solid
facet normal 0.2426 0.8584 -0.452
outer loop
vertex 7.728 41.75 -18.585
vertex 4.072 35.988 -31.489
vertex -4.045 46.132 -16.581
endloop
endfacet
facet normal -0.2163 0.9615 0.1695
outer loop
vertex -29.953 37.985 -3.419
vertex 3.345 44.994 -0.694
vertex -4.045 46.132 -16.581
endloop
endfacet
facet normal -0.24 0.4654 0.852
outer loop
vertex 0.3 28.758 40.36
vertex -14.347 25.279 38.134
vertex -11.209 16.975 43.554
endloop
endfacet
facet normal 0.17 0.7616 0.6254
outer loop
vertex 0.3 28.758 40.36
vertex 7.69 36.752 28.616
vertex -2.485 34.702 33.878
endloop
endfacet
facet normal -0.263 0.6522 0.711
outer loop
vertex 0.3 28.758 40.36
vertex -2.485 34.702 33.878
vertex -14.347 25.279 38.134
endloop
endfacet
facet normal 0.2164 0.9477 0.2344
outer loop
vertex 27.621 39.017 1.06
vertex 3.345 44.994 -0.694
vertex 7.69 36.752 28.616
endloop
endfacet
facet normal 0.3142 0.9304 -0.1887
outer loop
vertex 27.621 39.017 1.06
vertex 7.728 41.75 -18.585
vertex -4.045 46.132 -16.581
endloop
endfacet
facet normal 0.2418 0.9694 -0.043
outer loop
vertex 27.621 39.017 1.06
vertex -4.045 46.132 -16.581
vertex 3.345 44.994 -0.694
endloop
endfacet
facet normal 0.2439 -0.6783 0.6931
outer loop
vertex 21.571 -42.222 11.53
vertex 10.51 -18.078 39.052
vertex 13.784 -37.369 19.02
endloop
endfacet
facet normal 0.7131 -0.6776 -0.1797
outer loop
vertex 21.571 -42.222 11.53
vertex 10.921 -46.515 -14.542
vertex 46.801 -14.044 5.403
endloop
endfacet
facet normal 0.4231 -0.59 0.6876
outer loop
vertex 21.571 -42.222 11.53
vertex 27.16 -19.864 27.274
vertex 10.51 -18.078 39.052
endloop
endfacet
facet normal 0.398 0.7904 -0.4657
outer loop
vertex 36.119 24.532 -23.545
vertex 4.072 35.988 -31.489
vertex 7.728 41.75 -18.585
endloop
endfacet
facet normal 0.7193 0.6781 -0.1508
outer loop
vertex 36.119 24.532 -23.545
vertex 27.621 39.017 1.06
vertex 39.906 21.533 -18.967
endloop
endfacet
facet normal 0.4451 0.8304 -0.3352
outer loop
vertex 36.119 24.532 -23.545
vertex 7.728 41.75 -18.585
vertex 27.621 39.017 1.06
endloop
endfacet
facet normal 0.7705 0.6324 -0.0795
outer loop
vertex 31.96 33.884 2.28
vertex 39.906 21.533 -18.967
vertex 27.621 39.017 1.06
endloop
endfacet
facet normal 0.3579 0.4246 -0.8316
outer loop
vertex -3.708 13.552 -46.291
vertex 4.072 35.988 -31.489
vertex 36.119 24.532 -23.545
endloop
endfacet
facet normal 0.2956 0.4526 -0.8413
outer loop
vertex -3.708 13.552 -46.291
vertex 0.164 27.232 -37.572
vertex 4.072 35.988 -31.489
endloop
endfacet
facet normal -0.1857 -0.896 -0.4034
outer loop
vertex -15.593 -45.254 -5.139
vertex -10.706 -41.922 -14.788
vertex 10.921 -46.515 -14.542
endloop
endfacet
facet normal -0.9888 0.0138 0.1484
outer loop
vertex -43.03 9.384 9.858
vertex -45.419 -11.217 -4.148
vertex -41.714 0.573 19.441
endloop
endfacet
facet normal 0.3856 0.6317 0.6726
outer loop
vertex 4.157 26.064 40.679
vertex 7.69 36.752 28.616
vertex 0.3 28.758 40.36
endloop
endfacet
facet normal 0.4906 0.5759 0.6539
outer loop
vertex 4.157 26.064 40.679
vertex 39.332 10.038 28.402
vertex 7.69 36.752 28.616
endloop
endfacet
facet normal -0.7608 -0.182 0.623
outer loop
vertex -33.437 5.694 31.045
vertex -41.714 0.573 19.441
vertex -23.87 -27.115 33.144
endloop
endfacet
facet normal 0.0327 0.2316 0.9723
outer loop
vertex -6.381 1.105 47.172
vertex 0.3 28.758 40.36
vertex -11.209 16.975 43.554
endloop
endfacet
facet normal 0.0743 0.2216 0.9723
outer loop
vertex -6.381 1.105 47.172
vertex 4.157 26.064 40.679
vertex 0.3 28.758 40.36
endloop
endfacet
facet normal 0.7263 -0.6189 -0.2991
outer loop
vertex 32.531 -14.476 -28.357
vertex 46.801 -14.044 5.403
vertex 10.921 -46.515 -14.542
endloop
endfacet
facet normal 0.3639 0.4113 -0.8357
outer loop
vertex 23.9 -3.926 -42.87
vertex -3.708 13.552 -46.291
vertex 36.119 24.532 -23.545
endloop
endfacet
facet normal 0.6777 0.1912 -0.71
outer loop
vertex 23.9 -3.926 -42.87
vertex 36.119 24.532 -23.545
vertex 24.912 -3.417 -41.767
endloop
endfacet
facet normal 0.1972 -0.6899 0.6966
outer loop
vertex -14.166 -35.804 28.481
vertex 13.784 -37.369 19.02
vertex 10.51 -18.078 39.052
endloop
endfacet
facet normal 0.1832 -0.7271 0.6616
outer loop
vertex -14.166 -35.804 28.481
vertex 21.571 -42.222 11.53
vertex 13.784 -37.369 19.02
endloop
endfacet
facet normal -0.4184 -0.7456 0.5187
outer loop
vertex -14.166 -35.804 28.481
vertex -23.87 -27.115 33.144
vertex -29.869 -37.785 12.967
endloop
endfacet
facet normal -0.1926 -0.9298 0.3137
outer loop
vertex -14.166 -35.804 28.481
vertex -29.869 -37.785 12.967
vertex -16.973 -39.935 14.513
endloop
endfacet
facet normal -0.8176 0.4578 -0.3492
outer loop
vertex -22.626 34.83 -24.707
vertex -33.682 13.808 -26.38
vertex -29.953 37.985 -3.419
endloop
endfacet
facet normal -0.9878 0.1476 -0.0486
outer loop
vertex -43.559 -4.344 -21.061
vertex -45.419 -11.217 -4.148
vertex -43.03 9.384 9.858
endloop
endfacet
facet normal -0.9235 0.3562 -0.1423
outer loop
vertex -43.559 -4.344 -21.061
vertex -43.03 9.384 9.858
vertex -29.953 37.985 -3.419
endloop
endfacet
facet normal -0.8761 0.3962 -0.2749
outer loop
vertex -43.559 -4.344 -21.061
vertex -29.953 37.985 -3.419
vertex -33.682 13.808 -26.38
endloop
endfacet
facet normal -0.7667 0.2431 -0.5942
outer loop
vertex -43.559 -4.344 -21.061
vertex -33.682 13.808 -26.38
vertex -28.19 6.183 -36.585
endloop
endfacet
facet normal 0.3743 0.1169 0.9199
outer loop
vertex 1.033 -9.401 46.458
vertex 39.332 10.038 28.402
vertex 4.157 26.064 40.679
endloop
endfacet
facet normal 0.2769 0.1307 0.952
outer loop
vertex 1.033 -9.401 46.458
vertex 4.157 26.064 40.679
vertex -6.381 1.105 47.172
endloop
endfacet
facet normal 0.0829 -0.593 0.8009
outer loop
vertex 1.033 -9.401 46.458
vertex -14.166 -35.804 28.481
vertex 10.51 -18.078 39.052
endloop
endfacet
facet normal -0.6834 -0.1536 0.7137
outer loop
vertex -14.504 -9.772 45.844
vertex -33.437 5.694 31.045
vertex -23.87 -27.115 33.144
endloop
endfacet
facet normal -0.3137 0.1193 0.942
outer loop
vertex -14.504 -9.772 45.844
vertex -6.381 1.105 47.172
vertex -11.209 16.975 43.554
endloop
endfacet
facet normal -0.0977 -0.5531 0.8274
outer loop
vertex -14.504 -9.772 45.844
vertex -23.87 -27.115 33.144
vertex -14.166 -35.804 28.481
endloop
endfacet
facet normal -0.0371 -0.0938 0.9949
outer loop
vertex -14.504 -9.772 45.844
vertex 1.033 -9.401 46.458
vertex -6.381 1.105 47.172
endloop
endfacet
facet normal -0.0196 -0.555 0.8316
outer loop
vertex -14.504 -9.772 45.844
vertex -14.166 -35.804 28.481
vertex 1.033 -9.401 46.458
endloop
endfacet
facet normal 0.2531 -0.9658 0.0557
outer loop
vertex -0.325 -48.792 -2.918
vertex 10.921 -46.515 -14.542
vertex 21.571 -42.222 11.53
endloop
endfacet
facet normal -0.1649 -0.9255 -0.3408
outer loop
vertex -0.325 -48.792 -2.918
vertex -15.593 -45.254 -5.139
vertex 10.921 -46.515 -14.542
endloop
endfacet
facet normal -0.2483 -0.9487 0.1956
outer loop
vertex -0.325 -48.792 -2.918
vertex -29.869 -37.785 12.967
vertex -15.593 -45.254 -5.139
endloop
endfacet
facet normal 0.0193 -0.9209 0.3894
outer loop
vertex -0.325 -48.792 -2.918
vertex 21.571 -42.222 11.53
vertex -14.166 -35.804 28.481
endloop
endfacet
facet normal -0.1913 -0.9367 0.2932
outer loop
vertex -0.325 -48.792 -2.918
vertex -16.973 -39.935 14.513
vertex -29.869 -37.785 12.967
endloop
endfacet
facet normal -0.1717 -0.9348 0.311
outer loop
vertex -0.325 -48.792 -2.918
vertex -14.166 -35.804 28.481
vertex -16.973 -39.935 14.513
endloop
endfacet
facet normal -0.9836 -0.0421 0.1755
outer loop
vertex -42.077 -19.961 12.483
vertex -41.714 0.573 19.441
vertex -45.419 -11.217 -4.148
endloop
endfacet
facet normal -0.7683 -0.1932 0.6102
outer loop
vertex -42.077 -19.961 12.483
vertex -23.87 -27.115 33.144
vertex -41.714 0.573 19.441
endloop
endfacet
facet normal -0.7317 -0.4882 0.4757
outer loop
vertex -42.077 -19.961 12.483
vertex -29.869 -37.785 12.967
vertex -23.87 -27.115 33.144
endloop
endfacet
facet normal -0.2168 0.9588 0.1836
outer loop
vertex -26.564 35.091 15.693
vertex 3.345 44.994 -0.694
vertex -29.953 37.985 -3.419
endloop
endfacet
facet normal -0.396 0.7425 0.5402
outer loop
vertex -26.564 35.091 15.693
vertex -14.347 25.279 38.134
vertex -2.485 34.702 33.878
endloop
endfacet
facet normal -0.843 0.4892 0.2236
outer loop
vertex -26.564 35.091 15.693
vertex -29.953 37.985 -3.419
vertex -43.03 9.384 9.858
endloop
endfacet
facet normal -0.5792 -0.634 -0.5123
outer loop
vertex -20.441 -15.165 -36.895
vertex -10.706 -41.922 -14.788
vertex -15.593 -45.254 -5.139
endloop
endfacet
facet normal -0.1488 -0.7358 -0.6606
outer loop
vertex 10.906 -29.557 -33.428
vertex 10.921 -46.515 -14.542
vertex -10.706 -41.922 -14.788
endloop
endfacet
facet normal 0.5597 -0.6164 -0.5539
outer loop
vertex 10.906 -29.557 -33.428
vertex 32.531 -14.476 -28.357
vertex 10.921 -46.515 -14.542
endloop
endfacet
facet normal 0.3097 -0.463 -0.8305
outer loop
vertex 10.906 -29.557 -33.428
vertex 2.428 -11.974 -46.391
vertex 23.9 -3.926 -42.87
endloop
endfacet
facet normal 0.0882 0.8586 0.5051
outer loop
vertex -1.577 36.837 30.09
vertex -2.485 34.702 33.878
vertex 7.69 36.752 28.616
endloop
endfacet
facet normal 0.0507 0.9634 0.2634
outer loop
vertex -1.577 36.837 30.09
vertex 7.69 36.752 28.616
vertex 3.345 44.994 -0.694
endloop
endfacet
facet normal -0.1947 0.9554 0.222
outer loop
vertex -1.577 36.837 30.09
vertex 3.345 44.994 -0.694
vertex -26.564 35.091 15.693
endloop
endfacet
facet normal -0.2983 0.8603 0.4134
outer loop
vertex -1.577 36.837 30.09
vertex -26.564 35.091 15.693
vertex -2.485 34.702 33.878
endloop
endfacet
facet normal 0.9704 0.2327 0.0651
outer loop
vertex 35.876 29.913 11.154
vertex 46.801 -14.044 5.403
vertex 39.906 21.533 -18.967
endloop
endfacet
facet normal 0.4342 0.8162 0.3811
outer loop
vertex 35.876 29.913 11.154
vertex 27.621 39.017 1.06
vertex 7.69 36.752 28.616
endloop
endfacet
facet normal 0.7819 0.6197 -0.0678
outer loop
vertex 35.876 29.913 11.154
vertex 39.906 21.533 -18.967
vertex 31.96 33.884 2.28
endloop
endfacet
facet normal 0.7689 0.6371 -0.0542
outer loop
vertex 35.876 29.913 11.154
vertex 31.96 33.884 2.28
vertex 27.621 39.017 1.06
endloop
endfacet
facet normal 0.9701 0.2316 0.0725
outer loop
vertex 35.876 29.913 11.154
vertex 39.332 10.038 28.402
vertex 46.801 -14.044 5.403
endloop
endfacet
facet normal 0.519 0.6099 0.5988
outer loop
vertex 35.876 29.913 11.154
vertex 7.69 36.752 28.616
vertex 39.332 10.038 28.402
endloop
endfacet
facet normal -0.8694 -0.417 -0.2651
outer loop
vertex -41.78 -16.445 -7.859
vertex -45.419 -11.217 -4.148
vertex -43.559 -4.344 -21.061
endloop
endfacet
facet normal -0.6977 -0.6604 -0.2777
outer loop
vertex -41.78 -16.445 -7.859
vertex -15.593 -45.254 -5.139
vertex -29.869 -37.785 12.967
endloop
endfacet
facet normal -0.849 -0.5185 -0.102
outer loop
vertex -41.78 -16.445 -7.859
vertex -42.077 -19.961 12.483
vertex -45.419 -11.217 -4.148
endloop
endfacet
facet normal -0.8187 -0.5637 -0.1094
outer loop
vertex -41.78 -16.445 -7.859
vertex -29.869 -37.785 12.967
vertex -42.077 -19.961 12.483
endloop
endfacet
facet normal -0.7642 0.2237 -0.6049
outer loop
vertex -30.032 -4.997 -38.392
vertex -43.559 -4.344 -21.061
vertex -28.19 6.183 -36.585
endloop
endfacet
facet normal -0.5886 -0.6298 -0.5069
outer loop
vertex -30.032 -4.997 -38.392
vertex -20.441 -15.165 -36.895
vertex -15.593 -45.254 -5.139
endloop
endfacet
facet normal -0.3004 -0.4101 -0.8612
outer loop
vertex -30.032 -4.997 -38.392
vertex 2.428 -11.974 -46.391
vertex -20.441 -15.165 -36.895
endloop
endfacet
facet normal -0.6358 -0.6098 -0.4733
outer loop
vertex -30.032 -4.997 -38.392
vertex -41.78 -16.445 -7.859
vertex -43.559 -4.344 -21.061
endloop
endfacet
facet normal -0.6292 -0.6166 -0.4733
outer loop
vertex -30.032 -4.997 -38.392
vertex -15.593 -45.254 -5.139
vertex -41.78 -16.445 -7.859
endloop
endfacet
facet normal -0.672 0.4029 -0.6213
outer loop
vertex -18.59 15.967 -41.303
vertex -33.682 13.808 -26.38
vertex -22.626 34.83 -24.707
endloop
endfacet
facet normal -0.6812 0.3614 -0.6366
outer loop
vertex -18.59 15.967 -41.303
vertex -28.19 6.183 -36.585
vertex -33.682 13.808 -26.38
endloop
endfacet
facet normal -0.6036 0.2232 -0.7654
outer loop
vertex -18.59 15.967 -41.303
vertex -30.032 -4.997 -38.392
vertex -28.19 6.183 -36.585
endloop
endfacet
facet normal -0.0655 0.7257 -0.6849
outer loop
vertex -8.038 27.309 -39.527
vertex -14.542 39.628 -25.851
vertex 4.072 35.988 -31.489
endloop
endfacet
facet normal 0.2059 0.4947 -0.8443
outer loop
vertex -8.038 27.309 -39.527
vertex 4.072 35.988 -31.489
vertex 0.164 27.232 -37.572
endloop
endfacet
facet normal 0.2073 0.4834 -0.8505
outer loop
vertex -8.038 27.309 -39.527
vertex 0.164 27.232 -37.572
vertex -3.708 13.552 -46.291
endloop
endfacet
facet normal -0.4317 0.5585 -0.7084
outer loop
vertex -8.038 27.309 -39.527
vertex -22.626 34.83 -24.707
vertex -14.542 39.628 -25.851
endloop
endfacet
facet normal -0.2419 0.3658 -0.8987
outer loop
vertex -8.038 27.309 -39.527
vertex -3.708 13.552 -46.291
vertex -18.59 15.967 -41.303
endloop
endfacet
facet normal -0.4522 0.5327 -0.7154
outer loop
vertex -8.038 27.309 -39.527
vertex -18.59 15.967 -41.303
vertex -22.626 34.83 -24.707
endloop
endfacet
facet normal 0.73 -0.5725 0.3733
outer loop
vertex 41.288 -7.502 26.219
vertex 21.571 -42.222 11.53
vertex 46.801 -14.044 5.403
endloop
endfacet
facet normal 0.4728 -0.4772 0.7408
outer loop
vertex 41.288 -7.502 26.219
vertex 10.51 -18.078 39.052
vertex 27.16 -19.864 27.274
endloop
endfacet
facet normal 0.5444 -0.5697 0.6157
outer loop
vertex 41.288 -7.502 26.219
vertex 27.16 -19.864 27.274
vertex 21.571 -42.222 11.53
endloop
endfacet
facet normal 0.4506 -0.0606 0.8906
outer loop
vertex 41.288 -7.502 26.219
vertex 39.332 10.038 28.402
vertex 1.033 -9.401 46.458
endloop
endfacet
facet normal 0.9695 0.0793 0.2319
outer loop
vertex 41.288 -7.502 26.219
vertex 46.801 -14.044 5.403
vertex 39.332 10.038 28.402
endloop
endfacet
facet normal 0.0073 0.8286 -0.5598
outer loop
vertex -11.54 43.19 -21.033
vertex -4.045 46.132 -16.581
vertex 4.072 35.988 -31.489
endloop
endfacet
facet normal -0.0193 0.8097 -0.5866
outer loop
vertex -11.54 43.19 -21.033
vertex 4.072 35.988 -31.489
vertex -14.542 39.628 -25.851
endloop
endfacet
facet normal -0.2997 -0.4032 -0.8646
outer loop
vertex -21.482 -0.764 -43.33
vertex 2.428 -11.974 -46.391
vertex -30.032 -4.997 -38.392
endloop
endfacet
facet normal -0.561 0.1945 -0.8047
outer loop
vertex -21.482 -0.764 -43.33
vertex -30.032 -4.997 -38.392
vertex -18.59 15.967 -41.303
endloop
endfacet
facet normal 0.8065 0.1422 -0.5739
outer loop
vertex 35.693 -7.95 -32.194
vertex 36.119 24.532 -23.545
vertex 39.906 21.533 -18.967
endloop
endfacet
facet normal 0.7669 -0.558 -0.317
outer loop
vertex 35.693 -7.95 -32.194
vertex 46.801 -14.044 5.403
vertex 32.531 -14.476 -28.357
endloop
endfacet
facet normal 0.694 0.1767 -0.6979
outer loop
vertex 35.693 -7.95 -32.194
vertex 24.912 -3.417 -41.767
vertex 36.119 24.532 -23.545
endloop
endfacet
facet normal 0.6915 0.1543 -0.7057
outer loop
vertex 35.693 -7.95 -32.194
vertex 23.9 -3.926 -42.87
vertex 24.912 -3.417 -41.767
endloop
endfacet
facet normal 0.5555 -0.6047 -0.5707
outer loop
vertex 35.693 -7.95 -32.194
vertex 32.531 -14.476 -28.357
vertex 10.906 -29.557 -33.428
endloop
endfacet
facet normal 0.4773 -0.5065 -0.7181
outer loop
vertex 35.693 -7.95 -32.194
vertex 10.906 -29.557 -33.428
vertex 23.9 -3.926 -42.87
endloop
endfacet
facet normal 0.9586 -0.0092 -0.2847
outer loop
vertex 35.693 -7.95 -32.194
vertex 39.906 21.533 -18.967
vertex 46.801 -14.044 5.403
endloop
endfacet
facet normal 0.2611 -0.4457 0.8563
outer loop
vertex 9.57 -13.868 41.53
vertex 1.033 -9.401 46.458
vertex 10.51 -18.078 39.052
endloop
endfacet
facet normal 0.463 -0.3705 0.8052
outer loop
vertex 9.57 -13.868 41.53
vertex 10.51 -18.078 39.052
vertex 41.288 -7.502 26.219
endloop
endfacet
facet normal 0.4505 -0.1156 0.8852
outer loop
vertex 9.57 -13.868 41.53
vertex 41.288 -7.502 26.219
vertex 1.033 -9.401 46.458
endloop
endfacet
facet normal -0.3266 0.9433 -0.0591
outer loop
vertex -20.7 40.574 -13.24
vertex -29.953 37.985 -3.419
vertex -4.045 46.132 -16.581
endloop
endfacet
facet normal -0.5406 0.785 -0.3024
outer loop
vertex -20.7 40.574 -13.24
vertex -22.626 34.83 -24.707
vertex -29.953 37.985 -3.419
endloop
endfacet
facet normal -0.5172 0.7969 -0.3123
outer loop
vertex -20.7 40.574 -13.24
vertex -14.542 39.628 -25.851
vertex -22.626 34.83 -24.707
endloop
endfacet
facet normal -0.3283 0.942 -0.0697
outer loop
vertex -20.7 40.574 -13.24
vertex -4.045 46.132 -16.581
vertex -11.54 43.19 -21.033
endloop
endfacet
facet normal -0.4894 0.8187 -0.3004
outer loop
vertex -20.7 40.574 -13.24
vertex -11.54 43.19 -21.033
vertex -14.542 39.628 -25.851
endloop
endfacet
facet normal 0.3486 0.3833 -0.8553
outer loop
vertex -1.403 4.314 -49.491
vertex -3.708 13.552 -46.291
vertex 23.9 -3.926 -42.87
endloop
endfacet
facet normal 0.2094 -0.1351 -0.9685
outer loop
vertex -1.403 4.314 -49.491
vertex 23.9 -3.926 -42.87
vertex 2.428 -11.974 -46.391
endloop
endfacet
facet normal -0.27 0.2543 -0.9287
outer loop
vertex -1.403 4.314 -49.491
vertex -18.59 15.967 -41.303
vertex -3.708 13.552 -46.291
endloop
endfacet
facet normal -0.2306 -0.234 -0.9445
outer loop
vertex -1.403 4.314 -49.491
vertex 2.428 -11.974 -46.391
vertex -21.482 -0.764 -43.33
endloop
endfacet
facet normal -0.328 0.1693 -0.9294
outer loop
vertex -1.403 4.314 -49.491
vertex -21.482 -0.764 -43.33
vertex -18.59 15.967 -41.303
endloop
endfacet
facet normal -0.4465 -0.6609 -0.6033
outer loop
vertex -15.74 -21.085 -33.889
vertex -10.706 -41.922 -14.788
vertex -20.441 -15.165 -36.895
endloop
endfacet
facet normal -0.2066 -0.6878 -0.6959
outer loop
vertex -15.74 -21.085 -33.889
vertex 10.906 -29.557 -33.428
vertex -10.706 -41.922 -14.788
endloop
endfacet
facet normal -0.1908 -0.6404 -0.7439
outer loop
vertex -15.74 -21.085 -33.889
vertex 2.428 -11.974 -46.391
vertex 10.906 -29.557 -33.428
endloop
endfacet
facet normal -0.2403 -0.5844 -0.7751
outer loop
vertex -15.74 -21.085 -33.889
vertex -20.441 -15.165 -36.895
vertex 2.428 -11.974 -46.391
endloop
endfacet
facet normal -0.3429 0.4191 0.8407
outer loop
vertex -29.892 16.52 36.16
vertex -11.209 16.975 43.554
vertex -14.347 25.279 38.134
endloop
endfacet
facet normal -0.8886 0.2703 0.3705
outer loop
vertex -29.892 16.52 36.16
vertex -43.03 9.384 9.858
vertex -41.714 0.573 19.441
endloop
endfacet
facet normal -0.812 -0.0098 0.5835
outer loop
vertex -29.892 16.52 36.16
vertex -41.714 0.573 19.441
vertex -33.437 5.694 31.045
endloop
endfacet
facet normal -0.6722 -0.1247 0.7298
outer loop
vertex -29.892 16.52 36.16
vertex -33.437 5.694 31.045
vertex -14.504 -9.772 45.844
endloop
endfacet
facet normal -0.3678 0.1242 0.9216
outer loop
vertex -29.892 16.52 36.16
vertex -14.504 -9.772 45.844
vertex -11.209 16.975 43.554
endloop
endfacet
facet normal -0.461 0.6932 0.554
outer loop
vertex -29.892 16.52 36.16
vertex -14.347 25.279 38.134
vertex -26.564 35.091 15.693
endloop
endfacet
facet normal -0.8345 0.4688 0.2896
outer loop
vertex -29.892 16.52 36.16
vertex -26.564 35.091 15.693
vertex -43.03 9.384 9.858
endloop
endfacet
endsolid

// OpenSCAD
dimension = 3;
maxNumberOfPoints = 500;
seed = 1;
radius = 50;

module end_of_parameters_dummy() {}


//BEGIN: use <pointhull.scad>;
function _slice(list,start,end=undef) =
    let(end = end==undef?len(list):end)
    [for(i=[start:1:end-1]) list[i]];

function _delete(list,pos) =
    let(l=len(list))
    pos == 0 ? [for(i=[1:1:l-1]) list[i]] :
    pos >= l-1 ? [for(i=[0:1:pos-1]) list[i]] :
    concat([for(i=[0:1:pos-1]) list[i]],
        [for(i=[pos+1:1:l-1]) list[i]]);

function _areCollinear(a,b,c) = cross(b-a,c-a) == [0,0,0];

function _areCoplanar(a,b,c,d) = (d-a)*cross(b-a,c-a) == 0;

function _findNoncollinear(list,point1,point2,pos=0) =
    pos >= len(list) ? undef :
    ! _areCollinear(point1,point2,list[pos]) ? pos :
    _findNoncollinear(list,point1,point2,pos=pos+1);

function _findNoncoplanar(list,point1,point2,point3,pos=0) =
   pos >= len(list) ? undef :
   ! _areCoplanar(point1,point2,point3,list[pos]) ? pos :
        _findNoncoplanar(list,point1,point2,point3,pos=pos+1);

function _isBoundedBy(a,face,strict=false) =
    cross(face[1]-face[0],face[2]-face[0])*(a-face[0]);

function _makeTet(a,b,c,d) =
    _isBoundedBy(d,[a,b,c]) >= 0 ?
        [[a,b,c],[b,a,d],[c,b,d],[a,c,d]] :
        [[c,b,a],[d,a,b],[d,b,c],[d,c,a]];

function _findTri(list) =
    let(l2=_unique(list))
    assert(len(list)>=3)
    let(a=list[0],
        b=list[1],
        l3=_slice(list,2),
        ci=_findNoncollinear(l3,a,b),
        c=assert(ci != undef) l3[ci],
        l4=_delete(l3,ci))
        [[a,b,c],l4];

function _findTet(list) =
    let(ft=_findTri(list),
        tri=ft[0],
        l4=ft[1],
        di=assert(len(l4)>0) _findNoncoplanar(l4,tri[0],tri[1],tri[2]),
        d=assert(di != undef) l4[di],
        l5=_delete(l4,di))
        [_makeTet(tri[0],tri[1],tri[2],d),l5];

function _find(list,value) =
    let(m=search([value],list,1)[0])
    m==[] ? undef : m;

function _unique(list,soFar=[],pos=0) =
    pos >= len(list) ? soFar :
    _find(soFar,list[pos]) == undef ? _unique(list,soFar=concat(soFar,[list[pos]]),pos=pos+1) :
    _unique(list,soFar=soFar,pos=pos+1);

function _makePointsAndFaces(triangles) =
    let(points=_unique([for(t=triangles) for(v=t) v]))
        [points, [for(t=triangles) [for(v=t) _find(points,v)]]];

function _sameSide(p1,p2, a,b) =
    let(cp1 = cross(b-a, p1-a),
        cp2 = cross(b-a, p2-a))
        cp1*cp2 >= 0;

function _insideTriangle(p, t) =
    _sameSide(p,t[0],t[1],t[2]) &&
    _sameSide(p,t[1],t[0],t[2]) &&
    _sameSide(p,t[2],t[0],t[1]);


function _satisfiesConstraint(p, triangle) =
    let(c=_isBoundedBy(p, triangle))
    c > 0 || (c == 0 && _insideTriangle(p, triangle));


function _insidePoly(p, triangles, pos=0) =
    pos >= len(triangles) ? true :
    !_satisfiesConstraint(p, triangles[pos]) ? false :
    _insidePoly(p, triangles, pos=pos+1);

function _haveEdge(triangles, e, pos=0) =
    pos >= len(triangles) ? false :
    e==[triangles[pos][0],triangles[pos][1]] ||
        e==[triangles[pos][1],triangles[pos][2]] ||
        e==[triangles[pos][2],triangles[pos][0]] ? true :
        _haveEdge(triangles, e, pos=pos+1);

function _outerEdges(triangles) =
        let(edges=[for(t=triangles) for(e=[[t[0],t[1]],
                [t[1],t[2]],
                [t[2],t[0]]]) e])
        [for(e=edges) if(undef == _find(edges,[e[1],e[0]])) e];

function _unlit(triangles, p) = [for(t=triangles) if(_isBoundedBy(p, t) >= 0) t];

function _addToHull(h, p) =
    let(unlit = _unlit(h,p),
        edges = _outerEdges(unlit))
        concat(unlit, [for(e=edges) [e[1],e[0],p]]);

function _expandHull(h, points, pos=0) =
    pos >= len(points) ? h :
    !_insidePoly(points[pos],h) ?  _expandHull(_addToHull(h,points[pos]),points,pos=pos+1) :
    _expandHull(h, points, pos=pos+1);

function pointHull3D(points) =
    let(ft=_findTet(points))
        _expandHull(ft[0], ft[1]);

function _traceEdges(edgeStarts,edgeEnds,soFar=[]) =
    assert(soFar[len(soFar)-1] != undef)
    len(soFar)>1 && soFar[len(soFar)-1] == soFar[0] ? _slice(soFar,1) :
    _traceEdges(edgeStarts,edgeEnds,soFar=concat(soFar,[edgeEnds[_find(edgeStarts,soFar[len(soFar)-1])]]));

function _project(v) = [v[0],v[1]];

function pointHull2D(points) =
    let(
        p3d = concat([[0,0,1]], [for(p=points) [p[0],p[1],0]]),
        h = pointHull3D(p3d),
        edgeStarts = [for(t=h) if(t[0][2]==1 || t[1][2]==1 || t[2][2]==1)
                t[0][2]==1 ? _project(t[1]) :
                t[1][2]==1 ? _project(t[2]) :
                _project(t[0]) ],
        edgeEnds = [for(t=h) if(t[0][2]==1 || t[1][2]==1 || t[2][2]==1)
                t[0][2]==1 ? _project(t[2]) :
                t[1][2]==1 ? _project(t[0]) :
                _project(t[1]) ])
        _traceEdges(edgeStarts,edgeEnds,soFar=[edgeStarts[0]]);

module pointHull(points) {
    if (len(points[0])==2) {
        polygon(pointHull2D(points));
    }
    else {
        paf = _makePointsAndFaces(pointHull3D(points));
        polyhedron(points=paf[0],faces=paf[1]);
    }
}


//END: use <pointhull.scad>;



points0 = rands(-radius,radius,dimension*maxNumberOfPoints,seed);
points = [for (i=[0:maxNumberOfPoints-1]) let(p=[for(j=[0:dimension-1]) points0[i*dimension+j]]) if(norm(p)<=radius) p];

pointHull(points);
